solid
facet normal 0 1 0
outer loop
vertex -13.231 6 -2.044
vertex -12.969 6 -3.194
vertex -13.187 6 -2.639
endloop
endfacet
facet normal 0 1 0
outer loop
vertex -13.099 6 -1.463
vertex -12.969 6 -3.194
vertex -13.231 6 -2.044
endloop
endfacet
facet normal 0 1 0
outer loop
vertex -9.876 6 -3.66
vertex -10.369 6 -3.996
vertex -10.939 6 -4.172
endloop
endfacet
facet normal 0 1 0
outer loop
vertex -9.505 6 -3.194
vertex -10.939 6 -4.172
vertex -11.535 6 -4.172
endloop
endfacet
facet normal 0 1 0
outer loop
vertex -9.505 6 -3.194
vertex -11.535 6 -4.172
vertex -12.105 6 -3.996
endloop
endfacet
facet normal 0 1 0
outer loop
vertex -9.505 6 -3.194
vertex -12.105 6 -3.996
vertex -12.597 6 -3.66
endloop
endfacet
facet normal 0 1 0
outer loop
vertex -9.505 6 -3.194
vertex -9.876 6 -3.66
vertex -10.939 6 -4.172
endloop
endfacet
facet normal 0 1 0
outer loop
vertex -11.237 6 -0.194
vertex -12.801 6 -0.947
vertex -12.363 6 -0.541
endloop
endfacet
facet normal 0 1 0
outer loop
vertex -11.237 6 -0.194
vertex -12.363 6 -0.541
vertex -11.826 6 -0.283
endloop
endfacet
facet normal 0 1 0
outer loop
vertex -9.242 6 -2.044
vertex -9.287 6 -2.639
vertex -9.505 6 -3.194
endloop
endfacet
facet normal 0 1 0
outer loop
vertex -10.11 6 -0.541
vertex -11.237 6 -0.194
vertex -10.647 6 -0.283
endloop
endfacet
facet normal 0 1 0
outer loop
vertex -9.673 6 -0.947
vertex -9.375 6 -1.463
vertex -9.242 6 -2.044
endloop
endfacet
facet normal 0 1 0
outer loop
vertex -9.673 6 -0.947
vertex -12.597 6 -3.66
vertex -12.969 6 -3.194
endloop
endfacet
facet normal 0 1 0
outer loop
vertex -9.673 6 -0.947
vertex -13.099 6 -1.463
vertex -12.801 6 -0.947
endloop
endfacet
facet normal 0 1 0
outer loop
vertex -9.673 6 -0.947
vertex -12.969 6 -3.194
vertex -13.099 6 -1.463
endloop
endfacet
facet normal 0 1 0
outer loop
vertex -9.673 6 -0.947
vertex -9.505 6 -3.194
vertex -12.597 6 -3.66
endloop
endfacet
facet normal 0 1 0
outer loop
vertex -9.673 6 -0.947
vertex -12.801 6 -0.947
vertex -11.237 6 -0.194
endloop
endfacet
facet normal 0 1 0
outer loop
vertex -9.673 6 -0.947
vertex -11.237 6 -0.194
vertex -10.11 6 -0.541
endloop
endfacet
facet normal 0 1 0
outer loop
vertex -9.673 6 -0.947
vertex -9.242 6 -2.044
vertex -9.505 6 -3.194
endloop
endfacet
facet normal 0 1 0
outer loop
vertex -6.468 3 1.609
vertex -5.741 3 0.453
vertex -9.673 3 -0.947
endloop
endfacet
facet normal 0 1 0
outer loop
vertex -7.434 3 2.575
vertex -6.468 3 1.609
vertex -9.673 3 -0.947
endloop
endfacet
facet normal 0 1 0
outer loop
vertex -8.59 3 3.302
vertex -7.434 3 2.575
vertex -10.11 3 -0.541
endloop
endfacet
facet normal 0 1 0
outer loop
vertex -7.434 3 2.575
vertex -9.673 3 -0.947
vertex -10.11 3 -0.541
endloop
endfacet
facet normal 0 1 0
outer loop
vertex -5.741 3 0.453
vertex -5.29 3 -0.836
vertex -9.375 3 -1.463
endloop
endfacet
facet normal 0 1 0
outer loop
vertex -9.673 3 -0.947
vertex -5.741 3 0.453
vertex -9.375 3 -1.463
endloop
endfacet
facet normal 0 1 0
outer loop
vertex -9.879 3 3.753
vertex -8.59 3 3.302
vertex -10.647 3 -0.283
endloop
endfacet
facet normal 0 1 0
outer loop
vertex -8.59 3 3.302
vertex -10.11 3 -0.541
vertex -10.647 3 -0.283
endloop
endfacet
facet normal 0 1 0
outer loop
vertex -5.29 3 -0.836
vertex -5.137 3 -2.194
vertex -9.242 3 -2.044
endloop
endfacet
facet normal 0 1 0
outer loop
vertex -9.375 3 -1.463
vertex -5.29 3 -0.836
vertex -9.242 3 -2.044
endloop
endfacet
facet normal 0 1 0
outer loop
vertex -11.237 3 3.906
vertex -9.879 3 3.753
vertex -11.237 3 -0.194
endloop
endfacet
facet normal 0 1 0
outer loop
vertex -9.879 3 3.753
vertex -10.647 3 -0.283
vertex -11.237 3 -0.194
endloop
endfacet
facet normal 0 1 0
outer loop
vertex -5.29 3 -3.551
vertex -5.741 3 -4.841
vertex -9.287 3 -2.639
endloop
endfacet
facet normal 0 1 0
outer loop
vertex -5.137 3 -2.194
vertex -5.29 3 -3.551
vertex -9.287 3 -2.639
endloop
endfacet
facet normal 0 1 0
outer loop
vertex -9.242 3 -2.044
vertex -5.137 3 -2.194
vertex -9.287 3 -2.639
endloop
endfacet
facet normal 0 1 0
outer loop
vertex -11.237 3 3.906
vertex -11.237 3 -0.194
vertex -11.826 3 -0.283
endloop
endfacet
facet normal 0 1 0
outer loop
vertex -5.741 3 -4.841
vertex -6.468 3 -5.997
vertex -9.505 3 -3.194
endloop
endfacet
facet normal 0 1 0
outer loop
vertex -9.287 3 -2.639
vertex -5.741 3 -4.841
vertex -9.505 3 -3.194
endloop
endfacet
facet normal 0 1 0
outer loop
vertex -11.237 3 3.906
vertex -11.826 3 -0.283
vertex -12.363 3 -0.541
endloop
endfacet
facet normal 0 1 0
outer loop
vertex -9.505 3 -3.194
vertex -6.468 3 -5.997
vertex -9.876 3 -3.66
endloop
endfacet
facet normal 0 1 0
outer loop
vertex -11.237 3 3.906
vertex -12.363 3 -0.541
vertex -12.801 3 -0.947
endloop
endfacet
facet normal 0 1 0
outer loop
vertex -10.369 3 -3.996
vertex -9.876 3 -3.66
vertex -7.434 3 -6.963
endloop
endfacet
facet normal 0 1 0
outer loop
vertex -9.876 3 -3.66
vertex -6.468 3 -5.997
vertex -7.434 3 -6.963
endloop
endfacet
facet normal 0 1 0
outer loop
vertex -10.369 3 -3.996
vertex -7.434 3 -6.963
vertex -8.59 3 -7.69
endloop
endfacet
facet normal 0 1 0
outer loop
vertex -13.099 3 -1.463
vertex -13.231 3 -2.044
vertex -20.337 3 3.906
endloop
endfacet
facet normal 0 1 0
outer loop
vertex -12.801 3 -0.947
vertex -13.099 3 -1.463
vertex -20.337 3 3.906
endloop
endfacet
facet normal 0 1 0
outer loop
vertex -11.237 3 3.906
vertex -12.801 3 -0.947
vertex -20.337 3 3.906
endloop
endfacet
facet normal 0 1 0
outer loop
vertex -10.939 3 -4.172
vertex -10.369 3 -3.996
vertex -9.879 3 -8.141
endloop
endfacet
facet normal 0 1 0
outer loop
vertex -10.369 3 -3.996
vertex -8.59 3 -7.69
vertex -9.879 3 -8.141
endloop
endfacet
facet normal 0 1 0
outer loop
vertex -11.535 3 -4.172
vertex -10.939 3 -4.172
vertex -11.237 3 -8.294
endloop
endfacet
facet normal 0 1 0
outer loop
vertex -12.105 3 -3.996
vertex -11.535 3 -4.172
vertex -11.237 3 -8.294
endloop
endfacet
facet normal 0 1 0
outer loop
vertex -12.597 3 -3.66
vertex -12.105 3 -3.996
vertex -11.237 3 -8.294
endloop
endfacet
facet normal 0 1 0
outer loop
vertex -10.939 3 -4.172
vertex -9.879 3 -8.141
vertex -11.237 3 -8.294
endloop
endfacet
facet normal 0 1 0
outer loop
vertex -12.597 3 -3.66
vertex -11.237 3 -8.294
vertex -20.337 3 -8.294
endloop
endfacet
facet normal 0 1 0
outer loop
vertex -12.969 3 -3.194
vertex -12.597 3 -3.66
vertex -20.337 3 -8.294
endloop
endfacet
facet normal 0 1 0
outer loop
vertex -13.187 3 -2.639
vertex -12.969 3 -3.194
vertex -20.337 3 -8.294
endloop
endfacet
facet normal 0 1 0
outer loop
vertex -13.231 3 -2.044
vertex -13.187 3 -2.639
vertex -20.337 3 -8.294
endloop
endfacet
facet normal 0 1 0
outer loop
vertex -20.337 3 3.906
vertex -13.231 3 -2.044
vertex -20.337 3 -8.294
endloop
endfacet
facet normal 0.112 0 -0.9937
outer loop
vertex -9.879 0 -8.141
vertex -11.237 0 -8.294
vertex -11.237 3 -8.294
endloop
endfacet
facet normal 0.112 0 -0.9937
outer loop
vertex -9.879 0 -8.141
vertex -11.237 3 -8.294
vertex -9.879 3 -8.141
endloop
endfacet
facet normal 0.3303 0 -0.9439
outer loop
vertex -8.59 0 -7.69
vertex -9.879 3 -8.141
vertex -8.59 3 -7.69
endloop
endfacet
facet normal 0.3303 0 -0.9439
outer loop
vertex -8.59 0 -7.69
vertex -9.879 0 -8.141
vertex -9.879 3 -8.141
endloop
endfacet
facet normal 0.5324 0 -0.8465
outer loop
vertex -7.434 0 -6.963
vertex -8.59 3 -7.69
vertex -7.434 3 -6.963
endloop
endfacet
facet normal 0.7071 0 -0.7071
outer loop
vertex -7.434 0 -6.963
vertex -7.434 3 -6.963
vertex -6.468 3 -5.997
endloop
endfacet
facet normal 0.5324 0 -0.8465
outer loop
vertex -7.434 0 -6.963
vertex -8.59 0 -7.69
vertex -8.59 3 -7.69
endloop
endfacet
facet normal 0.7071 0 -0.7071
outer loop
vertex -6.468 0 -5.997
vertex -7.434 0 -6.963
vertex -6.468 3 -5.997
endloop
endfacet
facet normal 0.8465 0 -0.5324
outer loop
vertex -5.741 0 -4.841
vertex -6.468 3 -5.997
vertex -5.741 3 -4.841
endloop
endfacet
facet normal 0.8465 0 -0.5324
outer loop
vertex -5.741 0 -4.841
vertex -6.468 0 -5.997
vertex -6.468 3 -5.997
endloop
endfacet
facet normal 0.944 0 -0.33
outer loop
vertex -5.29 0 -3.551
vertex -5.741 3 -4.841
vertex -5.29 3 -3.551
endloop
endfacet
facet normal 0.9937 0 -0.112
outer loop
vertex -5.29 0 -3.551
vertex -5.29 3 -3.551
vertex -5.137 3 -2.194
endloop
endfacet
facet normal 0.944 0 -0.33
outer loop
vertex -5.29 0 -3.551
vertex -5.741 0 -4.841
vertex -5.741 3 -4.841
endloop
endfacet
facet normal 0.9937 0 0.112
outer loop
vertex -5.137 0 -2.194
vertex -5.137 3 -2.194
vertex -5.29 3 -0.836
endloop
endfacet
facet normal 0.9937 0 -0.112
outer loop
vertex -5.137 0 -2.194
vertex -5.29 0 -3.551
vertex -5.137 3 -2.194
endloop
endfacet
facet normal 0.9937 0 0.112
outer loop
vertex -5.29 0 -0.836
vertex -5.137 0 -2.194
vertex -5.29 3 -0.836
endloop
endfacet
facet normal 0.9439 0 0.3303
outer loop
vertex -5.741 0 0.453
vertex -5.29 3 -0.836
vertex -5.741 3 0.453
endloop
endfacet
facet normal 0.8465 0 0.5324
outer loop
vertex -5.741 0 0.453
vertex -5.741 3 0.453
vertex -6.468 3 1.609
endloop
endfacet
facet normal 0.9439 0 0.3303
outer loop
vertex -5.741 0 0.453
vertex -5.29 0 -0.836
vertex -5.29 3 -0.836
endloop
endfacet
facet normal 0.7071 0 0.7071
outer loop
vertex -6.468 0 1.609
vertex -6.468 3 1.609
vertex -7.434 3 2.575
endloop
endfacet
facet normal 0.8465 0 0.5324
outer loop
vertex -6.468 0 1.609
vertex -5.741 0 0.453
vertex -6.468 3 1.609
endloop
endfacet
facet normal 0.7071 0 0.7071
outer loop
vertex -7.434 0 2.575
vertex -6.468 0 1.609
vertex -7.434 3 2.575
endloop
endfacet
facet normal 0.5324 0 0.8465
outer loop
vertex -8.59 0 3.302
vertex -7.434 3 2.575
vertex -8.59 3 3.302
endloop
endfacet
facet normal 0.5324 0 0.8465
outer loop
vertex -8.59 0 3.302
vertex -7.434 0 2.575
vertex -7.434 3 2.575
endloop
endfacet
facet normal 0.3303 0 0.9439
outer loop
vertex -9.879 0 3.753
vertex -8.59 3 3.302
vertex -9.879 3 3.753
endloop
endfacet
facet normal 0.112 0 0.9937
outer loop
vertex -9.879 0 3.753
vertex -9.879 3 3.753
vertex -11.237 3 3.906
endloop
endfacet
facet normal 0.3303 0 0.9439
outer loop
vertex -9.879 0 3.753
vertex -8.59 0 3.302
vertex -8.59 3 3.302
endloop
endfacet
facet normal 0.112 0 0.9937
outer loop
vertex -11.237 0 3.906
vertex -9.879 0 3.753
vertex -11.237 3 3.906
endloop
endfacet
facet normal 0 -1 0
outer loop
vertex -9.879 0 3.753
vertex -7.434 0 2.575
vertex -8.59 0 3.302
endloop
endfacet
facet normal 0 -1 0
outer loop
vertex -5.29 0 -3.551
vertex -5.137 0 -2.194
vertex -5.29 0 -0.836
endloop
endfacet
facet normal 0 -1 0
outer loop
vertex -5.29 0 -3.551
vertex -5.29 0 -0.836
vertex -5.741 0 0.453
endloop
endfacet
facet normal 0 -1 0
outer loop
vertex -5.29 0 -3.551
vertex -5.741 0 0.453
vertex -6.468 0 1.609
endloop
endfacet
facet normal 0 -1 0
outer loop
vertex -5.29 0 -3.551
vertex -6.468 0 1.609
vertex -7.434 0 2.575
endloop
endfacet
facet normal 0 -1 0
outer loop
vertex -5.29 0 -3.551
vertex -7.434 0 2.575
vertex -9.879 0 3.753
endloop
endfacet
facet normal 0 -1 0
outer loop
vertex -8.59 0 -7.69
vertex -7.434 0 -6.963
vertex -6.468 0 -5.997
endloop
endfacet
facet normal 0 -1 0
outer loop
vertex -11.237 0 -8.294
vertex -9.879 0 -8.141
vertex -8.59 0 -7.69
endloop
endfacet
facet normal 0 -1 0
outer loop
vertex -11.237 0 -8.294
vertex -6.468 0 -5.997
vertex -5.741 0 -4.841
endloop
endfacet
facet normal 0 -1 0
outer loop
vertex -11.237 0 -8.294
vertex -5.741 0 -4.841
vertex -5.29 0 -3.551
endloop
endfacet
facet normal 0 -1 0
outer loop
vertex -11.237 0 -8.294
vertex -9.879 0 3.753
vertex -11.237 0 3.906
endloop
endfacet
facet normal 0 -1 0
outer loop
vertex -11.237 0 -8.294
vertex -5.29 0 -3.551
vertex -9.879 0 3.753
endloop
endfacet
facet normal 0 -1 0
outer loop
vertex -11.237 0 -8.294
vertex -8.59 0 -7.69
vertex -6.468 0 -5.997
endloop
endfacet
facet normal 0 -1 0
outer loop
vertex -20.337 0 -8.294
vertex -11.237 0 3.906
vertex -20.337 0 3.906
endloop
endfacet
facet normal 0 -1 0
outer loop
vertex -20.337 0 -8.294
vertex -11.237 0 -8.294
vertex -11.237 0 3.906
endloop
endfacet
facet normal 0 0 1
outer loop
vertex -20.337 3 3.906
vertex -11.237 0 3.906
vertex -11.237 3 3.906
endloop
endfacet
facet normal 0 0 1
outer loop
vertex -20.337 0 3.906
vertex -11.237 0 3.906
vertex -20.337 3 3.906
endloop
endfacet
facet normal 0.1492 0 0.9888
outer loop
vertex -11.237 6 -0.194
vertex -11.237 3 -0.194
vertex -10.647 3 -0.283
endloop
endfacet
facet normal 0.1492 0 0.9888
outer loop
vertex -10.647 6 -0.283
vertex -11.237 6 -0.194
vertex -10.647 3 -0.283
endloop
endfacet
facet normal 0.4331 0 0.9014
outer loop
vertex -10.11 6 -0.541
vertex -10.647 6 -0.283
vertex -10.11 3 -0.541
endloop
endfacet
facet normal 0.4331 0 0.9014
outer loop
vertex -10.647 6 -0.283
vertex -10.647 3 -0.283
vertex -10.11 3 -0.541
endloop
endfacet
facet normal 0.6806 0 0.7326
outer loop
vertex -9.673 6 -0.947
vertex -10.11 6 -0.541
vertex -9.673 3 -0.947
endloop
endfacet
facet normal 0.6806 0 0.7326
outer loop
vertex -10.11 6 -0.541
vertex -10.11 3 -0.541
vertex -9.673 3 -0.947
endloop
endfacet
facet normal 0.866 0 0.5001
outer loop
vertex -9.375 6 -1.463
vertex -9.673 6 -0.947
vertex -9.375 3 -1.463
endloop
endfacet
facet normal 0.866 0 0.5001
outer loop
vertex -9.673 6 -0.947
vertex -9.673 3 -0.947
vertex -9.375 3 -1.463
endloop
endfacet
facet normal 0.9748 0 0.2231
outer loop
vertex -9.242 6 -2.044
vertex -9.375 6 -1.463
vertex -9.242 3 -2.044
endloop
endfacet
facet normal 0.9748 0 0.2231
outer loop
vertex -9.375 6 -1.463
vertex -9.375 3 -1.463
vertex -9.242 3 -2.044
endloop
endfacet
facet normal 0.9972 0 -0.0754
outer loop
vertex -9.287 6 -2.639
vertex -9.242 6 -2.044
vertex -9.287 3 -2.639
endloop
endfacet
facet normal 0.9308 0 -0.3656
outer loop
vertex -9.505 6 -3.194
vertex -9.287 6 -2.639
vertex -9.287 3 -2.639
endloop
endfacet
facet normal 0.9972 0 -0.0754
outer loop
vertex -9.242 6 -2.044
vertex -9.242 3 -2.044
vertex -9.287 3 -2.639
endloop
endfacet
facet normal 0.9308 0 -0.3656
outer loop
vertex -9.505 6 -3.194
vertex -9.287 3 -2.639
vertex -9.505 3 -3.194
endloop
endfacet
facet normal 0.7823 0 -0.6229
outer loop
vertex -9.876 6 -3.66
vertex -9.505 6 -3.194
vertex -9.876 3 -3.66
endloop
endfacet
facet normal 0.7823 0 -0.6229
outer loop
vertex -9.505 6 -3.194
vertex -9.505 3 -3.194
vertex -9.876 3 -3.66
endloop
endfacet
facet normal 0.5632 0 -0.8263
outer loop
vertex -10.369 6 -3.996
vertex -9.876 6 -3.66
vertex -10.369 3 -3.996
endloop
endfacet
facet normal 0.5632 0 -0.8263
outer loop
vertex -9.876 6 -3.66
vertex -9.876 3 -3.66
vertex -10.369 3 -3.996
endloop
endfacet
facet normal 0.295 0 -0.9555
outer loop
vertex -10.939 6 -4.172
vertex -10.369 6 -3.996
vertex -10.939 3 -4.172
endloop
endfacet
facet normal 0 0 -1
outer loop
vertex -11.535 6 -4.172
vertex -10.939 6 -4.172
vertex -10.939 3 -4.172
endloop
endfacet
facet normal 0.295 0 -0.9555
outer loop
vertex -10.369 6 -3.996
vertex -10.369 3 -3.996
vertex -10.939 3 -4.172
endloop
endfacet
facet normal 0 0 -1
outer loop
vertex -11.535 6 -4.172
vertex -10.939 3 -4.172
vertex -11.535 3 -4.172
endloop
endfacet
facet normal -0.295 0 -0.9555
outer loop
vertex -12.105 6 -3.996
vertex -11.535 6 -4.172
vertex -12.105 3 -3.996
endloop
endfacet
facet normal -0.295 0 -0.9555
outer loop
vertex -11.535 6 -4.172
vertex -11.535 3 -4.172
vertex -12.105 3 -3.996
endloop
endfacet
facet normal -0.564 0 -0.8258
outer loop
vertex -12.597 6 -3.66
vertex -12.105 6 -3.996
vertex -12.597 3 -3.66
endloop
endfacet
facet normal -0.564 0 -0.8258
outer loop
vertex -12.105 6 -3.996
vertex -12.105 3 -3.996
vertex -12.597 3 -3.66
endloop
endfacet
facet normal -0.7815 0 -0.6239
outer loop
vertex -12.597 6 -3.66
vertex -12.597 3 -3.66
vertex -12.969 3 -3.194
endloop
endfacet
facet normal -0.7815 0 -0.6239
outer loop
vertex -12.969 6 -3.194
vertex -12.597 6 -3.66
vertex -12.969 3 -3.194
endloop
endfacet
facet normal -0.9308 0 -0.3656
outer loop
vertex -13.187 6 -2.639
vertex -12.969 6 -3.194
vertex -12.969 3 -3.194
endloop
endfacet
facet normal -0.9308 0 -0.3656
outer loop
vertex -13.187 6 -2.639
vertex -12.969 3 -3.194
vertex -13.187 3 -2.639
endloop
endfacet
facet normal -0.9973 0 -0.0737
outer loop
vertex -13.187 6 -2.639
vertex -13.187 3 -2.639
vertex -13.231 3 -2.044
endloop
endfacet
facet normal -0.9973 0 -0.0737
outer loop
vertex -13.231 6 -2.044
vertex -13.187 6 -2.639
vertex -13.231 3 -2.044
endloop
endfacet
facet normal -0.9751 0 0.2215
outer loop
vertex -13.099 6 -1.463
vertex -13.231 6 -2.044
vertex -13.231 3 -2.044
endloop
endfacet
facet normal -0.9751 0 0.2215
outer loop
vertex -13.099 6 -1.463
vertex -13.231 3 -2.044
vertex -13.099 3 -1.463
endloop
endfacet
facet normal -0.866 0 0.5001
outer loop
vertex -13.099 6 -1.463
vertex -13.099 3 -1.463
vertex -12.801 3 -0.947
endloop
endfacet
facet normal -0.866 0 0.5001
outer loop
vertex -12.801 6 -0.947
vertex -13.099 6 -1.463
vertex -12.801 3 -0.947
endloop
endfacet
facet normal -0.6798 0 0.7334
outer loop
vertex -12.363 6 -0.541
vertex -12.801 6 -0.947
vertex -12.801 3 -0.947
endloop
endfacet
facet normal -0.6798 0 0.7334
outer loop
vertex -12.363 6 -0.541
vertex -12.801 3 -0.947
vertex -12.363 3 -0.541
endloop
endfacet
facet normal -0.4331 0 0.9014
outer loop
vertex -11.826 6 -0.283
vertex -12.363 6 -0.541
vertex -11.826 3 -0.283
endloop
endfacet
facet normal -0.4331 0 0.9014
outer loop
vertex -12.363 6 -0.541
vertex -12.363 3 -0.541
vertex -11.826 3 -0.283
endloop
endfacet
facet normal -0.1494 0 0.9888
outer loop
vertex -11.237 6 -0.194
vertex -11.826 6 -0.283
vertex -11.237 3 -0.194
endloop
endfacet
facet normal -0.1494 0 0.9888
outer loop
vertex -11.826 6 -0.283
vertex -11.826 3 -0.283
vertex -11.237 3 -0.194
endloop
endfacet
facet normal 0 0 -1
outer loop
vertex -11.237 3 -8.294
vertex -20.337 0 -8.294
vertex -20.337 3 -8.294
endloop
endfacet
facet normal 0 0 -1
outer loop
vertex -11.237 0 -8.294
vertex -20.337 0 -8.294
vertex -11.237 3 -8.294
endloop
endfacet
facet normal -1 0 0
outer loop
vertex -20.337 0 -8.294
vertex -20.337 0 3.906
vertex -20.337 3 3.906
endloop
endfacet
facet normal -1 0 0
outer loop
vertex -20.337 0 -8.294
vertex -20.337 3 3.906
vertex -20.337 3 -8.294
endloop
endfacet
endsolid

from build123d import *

# Parameters (mm, degrees)
BOSS_EXTRUDE1_DEPTH = 3
SKETCH4_R           = 2
BOSS_EXTRUDE2_DEPTH = 3


with BuildPart() as part:
    # Sketch3 → Boss-Extrude1 (new body)
    with BuildSketch(Plane(origin=(0, 0, 0), x_dir=(1, 0, 0), z_dir=(0, 1, 0))):
        with BuildLine():
            Line((-20.336842105, 8.293859649), (-11.236842105, 8.293859649))
            ThreePointArc((-11.236842105, 8.293859649), (-5.136842105, 2.193859649), (-11.236842105, -3.906140351))
            Line((-11.236842105, -3.906140351), (-20.336842105, -3.906140351))
            Line((-20.336842105, -3.906140351), (-20.336842105, 8.293859649))
        make_face()
    extrude(amount=BOSS_EXTRUDE1_DEPTH)

    # Sketch4 → Boss-Extrude2 (add)
    with BuildSketch(Plane(origin=(0, 3, 0), x_dir=(1, 0, 0), z_dir=(0, 1, 0))):
        with Locations(Location((-11.236842105, 2.193859649, 0), (0, 0, 270))):
            Circle(SKETCH4_R)
    extrude(amount=BOSS_EXTRUDE2_DEPTH)


solid = part.part
